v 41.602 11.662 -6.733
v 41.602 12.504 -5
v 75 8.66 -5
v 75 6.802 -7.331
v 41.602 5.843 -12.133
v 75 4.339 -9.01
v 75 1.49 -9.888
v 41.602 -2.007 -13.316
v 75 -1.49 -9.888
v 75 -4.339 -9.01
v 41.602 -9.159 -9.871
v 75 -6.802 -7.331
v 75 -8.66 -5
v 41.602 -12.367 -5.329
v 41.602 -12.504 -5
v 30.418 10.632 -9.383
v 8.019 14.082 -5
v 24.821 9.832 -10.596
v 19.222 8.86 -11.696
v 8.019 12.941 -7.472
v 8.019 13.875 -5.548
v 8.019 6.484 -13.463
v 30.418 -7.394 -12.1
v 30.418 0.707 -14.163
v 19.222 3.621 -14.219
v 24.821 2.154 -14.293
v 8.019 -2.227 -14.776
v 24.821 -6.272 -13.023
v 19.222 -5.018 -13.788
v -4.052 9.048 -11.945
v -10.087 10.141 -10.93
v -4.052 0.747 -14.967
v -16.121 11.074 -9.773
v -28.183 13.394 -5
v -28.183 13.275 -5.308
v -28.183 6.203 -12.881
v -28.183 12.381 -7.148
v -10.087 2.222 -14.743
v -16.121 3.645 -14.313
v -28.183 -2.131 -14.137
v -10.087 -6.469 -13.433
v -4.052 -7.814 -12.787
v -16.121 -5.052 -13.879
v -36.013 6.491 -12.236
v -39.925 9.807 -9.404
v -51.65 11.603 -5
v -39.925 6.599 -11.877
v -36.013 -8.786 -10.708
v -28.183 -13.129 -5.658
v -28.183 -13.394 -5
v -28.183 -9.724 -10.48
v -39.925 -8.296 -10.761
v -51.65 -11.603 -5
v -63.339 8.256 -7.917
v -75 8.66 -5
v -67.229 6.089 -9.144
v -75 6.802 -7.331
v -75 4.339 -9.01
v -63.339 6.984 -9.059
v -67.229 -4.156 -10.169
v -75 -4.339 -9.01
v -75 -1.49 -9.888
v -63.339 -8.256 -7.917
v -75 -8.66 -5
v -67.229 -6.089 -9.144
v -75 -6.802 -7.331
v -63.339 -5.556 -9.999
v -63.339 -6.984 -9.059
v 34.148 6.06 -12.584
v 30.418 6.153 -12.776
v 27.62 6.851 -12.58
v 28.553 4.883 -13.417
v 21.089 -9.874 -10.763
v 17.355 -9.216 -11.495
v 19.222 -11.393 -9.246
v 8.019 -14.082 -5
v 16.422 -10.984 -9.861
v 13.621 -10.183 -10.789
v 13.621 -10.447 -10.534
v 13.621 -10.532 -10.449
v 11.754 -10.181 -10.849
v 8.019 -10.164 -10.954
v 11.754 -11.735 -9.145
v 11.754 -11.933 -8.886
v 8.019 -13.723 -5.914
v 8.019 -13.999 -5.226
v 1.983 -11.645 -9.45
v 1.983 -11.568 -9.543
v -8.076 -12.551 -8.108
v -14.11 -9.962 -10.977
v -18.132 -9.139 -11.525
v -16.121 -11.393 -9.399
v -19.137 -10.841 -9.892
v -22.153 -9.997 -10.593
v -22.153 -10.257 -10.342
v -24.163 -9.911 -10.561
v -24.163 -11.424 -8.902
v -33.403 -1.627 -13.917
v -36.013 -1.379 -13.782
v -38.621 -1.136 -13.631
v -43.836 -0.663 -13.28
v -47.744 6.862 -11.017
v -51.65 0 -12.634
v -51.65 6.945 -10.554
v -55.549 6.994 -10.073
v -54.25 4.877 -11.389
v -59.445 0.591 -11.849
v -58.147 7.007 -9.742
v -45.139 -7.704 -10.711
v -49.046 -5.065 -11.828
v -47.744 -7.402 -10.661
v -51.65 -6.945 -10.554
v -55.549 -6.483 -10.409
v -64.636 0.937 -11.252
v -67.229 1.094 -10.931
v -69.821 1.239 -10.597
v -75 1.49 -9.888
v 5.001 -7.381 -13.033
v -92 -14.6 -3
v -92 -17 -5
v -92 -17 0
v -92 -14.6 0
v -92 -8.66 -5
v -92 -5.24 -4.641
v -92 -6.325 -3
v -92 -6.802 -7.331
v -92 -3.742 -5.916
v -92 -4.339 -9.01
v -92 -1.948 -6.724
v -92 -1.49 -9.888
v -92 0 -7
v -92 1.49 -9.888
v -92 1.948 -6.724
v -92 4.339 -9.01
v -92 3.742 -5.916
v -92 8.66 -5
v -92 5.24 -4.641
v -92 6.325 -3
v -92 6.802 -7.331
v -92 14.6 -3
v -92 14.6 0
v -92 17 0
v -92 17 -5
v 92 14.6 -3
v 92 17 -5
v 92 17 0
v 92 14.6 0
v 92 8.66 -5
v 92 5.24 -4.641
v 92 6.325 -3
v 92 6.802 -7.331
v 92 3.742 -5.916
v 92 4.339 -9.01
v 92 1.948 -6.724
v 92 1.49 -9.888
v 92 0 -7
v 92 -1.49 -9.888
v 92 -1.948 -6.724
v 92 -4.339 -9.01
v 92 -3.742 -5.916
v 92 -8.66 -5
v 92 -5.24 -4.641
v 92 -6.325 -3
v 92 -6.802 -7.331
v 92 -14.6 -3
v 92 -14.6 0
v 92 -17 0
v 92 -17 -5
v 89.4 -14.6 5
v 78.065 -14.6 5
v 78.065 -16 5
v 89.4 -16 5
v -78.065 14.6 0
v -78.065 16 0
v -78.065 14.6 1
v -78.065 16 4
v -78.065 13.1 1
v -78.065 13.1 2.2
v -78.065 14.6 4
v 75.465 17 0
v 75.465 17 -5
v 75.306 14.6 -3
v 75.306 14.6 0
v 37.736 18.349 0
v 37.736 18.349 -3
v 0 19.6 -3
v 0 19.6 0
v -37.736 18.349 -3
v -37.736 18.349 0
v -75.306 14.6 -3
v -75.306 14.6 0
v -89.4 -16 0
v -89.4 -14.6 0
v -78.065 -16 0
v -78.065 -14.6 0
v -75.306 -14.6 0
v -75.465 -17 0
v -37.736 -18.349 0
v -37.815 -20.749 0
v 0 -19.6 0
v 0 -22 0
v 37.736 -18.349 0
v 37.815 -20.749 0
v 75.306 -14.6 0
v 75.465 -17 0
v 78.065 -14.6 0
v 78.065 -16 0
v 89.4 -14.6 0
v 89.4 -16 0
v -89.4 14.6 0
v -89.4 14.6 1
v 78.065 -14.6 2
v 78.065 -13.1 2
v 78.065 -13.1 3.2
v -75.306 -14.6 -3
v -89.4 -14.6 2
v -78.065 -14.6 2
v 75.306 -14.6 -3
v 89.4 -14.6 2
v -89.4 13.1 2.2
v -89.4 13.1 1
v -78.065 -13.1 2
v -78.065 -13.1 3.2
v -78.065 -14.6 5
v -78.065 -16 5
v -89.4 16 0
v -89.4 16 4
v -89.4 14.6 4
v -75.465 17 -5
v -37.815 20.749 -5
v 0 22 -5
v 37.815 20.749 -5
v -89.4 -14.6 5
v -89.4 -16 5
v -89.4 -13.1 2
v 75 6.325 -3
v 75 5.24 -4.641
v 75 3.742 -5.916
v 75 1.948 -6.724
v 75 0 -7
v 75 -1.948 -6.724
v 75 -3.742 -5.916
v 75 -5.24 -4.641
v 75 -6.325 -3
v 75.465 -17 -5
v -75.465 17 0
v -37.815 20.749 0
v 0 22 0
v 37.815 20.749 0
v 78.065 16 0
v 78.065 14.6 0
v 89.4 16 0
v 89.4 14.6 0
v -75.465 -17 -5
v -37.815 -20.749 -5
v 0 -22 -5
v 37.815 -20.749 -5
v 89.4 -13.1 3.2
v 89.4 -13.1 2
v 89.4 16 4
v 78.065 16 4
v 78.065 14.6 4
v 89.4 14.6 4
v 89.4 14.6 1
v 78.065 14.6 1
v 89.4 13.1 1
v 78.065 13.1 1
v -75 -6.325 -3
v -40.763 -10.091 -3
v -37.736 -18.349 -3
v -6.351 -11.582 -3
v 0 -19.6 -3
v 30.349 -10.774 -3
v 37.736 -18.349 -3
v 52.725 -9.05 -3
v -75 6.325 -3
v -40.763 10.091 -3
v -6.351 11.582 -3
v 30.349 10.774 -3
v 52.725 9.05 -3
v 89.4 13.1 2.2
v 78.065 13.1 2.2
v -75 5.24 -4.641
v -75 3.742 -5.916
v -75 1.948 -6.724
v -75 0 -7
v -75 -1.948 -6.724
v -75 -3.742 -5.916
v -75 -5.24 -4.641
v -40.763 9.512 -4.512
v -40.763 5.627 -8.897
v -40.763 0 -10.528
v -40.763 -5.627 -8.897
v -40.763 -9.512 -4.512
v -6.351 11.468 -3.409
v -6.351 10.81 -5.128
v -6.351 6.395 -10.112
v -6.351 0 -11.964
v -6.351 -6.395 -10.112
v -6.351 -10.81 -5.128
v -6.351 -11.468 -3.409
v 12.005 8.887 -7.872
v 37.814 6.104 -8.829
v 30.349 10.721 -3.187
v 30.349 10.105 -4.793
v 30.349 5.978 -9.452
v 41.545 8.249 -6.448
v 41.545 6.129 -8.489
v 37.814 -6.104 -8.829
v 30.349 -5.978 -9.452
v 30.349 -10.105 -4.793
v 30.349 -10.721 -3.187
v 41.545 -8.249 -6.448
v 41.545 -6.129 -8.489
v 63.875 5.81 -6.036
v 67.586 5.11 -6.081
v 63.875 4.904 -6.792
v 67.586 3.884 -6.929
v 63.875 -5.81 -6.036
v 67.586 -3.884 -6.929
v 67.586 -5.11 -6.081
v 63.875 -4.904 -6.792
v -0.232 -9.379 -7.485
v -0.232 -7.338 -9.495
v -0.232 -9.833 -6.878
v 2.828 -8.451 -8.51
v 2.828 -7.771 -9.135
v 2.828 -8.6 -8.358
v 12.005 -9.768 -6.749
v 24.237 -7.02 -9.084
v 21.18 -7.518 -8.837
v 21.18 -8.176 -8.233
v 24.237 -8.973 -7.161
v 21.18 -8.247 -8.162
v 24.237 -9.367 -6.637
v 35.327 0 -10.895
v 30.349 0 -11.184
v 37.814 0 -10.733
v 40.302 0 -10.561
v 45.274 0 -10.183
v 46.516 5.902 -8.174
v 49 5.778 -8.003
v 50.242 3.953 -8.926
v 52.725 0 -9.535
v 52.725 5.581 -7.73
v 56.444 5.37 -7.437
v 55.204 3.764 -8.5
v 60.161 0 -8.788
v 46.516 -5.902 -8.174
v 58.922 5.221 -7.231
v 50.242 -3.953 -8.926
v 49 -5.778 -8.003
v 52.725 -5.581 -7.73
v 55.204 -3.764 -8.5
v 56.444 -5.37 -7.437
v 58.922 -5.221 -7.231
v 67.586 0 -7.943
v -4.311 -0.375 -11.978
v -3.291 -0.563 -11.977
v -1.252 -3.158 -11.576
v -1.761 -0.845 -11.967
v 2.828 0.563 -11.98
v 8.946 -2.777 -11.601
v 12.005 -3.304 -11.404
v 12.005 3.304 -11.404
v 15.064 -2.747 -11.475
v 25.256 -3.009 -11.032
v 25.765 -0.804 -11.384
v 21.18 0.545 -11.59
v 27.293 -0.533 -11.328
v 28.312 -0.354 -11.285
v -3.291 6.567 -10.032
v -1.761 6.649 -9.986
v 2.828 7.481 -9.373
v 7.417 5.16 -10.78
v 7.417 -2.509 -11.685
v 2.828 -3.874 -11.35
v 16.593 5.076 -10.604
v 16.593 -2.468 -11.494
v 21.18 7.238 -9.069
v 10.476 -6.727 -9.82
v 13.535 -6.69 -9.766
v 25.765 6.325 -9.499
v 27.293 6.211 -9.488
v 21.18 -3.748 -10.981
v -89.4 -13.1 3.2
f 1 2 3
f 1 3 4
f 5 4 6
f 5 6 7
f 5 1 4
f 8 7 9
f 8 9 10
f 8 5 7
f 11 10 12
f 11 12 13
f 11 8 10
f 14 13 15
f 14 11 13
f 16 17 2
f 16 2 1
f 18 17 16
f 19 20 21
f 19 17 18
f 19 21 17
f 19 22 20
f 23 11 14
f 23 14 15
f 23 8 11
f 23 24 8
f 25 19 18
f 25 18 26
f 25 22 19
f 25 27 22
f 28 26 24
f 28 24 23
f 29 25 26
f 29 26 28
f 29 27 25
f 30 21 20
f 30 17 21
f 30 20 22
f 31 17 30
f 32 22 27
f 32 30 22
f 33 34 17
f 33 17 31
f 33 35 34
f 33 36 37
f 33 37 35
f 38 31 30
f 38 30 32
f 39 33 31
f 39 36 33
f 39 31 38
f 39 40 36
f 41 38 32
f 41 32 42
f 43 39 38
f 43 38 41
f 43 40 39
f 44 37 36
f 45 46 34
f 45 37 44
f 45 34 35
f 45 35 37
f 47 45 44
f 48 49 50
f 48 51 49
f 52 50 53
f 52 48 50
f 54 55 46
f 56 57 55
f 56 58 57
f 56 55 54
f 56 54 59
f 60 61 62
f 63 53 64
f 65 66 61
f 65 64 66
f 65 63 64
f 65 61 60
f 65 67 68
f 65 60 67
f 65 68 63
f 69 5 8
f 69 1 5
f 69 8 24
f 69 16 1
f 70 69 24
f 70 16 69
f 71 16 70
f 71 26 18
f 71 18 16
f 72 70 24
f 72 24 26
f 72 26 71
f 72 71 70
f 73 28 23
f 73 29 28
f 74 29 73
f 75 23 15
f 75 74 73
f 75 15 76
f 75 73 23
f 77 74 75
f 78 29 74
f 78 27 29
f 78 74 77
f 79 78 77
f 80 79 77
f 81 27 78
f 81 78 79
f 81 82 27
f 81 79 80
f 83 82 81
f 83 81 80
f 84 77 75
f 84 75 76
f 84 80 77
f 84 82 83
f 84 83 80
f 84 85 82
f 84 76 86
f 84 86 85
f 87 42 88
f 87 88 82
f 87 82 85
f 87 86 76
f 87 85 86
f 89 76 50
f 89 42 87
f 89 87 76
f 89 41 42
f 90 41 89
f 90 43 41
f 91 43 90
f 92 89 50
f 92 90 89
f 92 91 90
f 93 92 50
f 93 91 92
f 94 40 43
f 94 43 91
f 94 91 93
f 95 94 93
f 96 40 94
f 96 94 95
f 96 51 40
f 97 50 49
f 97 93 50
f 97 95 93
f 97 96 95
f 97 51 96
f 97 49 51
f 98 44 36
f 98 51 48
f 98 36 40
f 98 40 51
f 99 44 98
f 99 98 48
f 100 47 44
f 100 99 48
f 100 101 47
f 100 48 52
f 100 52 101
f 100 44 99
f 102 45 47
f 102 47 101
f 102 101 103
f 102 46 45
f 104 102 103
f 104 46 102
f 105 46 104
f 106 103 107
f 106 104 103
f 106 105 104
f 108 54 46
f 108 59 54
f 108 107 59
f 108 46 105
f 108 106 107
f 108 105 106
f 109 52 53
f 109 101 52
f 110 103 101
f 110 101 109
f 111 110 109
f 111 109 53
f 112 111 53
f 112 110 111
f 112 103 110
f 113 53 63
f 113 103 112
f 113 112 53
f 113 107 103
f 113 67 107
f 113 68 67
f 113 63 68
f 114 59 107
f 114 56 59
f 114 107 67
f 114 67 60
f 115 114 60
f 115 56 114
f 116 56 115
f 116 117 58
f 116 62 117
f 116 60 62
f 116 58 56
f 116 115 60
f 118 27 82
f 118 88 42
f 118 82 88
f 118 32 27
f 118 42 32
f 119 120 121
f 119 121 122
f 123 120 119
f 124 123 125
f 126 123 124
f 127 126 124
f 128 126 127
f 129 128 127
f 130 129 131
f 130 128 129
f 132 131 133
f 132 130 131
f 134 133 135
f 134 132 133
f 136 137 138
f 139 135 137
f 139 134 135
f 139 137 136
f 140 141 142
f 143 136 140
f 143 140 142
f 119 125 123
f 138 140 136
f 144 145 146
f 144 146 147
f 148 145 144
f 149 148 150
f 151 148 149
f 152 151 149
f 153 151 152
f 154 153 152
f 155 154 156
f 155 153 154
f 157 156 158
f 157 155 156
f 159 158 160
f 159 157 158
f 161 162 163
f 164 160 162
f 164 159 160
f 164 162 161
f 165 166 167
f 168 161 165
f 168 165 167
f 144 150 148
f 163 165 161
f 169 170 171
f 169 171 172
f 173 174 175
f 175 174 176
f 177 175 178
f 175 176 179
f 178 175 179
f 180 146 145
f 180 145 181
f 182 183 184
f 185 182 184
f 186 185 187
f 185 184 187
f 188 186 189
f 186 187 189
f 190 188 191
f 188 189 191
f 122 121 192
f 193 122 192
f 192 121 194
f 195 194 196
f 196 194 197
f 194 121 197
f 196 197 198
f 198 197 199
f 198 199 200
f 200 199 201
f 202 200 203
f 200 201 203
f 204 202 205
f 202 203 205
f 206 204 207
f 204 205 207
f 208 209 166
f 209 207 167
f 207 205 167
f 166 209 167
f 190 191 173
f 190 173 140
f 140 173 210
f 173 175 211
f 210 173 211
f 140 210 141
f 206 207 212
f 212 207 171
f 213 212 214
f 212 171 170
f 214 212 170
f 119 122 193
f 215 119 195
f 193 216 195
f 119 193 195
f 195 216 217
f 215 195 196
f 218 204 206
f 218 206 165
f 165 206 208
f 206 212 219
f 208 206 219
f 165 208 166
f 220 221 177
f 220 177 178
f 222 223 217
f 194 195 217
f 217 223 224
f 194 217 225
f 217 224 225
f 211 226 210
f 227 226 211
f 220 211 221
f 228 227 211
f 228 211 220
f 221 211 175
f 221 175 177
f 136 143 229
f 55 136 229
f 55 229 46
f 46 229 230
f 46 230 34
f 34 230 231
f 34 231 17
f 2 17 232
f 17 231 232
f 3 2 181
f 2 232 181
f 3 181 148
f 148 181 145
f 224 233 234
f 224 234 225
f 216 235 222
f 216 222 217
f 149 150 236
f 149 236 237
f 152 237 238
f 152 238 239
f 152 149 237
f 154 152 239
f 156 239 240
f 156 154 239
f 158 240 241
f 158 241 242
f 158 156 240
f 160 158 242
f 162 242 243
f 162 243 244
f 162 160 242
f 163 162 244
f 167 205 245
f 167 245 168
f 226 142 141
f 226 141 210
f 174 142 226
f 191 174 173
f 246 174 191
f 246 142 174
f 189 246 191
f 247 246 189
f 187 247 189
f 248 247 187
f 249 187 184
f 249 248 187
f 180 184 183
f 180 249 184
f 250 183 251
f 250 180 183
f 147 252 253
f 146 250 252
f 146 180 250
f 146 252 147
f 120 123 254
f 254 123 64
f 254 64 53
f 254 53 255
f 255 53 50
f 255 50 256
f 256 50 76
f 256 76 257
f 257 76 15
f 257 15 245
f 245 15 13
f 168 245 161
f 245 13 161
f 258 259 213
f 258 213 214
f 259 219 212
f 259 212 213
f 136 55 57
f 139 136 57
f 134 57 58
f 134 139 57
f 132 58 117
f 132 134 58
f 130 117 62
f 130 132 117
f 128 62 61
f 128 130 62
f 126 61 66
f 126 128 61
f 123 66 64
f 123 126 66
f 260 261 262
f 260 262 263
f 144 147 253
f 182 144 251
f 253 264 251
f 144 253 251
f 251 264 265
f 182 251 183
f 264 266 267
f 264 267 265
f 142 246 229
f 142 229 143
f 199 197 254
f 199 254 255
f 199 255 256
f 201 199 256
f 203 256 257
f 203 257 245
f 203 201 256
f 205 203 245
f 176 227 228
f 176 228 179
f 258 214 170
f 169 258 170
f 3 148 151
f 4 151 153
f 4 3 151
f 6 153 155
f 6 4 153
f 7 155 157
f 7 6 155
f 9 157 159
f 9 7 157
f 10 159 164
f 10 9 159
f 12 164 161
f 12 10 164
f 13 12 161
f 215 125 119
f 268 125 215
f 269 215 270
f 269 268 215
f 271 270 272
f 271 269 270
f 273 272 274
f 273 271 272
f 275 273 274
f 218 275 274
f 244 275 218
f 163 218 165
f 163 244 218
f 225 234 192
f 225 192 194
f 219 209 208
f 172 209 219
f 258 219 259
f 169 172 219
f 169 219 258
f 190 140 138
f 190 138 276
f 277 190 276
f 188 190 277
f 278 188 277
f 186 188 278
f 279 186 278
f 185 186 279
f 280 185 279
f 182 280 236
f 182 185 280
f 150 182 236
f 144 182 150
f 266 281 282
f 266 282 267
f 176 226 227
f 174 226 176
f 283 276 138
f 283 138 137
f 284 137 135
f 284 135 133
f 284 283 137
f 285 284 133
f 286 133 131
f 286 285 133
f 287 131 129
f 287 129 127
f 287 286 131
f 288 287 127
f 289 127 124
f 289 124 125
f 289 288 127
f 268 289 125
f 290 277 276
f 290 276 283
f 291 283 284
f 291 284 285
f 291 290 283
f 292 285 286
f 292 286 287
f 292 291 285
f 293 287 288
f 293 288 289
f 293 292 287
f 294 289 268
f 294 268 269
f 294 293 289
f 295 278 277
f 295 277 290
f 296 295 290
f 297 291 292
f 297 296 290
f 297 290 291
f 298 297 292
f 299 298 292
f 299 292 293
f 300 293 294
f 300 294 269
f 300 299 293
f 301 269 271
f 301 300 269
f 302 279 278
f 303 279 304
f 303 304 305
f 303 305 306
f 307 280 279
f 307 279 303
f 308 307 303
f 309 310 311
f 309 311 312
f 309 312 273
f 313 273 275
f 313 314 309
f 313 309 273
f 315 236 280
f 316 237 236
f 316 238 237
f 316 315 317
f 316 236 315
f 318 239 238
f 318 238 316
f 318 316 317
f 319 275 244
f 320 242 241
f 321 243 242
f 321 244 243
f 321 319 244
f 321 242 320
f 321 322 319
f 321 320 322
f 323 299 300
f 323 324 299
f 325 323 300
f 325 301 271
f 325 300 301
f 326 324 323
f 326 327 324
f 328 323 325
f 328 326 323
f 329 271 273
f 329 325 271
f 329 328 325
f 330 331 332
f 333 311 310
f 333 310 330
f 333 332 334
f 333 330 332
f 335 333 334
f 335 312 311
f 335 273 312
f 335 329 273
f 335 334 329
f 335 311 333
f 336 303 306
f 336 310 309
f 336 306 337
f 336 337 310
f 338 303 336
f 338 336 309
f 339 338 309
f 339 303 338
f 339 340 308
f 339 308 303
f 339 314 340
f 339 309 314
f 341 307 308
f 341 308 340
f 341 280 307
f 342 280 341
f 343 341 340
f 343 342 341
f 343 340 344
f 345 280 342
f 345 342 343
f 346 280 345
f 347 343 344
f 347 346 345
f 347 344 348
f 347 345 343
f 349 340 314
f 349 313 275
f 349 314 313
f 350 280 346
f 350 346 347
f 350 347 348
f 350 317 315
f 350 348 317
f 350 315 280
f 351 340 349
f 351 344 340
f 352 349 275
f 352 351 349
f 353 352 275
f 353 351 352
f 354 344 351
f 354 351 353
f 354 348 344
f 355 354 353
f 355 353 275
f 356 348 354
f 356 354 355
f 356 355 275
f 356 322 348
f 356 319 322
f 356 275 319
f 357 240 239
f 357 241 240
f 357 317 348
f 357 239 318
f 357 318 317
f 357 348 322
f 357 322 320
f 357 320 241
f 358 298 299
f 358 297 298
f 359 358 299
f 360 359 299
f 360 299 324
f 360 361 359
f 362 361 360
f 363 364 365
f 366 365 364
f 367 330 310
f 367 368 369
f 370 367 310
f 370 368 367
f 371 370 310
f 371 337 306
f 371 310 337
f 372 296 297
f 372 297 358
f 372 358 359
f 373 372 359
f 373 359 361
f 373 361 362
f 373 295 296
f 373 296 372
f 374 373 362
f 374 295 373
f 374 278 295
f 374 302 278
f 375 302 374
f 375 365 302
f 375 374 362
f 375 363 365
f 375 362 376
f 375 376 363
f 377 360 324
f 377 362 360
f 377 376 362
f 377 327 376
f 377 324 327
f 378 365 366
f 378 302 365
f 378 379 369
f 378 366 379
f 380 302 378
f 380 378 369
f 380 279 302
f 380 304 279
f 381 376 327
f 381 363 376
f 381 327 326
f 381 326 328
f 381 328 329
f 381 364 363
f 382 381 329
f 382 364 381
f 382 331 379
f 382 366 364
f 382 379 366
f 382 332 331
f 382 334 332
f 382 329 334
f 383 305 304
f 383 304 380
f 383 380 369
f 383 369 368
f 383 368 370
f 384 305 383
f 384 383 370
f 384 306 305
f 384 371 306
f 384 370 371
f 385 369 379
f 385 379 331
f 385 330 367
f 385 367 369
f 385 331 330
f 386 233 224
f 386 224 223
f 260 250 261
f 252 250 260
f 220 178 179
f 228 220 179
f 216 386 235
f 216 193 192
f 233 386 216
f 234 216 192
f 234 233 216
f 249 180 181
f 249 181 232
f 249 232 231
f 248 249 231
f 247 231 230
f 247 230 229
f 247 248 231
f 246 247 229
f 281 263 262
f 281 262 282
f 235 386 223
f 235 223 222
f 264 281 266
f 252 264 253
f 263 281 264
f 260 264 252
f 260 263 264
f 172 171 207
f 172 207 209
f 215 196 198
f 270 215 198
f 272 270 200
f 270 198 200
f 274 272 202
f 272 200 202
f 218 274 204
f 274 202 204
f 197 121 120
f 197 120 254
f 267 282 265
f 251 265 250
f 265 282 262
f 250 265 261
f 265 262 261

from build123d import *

# Parameters (mm, degrees)
F1_ANGLE  = 180
F3_DEPTH  = 5
F5_DEPTH  = 5
F7_DEPTH  = 3
F9_DEPTH  = 17
F11_DEPTH = 17
F13_DEPTH = 3
F15_DEPTH = 17
F17_DEPTH = 17
F19_DEPTH = 3
F21_DEPTH = 3
F22_W     = 11.3347762211
F22_H     = 1.4
F23_DEPTH = 4
F24_W     = 11.3347762211
F24_H     = 2.4
F25_DEPTH = 5
F27_DEPTH = 11.3347762211
F28_W     = 11.3347762211
F28_H     = 5
F29_DEPTH = 1
F31_DEPTH = 11.3347762211
F32_W     = 11.3347762211
F32_H     = 5
F33_DEPTH = 1
F35_DEPTH = 11.3347762211
F37_DEPTH = 11.3347762211


with BuildPart() as f1:
    # F0 (on Top) → F1 (revolve)
    with BuildSketch(Plane.XY):
        with BuildLine():
            ThreePointArc((-75, 7), (0, 12), (75, 7))
            Line((75, 7), (92, 7))
            Line((92, 7), (92, 10))
            Line((92, 10), (75, 10))
            ThreePointArc((75, 10), (0, 15), (-75, 10))
            Line((-75, 10), (-92, 10))
            Line((-92, 10), (-92, 7))
            Line((-92, 7), (-75, 7))
        make_face()
    revolve(axis=Axis((-37.5, 0, 0), (-1, 0, 0)), revolution_arc=F1_ANGLE)

    # F2 (on face) → F3 (join)
    with BuildSketch(Plane.XY):
        with BuildLine():
            Line((-75, 10), (-92, 10))
            Line((-92, 10), (-92, 7))
            Line((-92, 7), (-75, 7))
            ThreePointArc((-75, 7), (0, 12), (75, 7))
            Line((75, 7), (92, 7))
            Line((92, 7), (92, 10))
            Line((92, 10), (75, 10))
            ThreePointArc((75, 10), (0, 15), (-75, 10))
        make_face()
        with BuildLine():
            Line((-75.4652237789, 17), (-92, 17))
            Line((-92, 17), (-92, 10))
            Line((-92, 10), (-75, 10))
            ThreePointArc((-75, 10), (0, 15), (75, 10))
            Line((75, 10), (92, 10))
            Line((92, 10), (92, 17))
            Line((92, 17), (75.4652237789, 17))
            ThreePointArc((75.4652237789, 17), (0, 22), (-75.4652237789, 17))
        make_face()
    extrude(amount=-F3_DEPTH)

    # F4 (on face) → F5 (join)
    with BuildSketch(Plane.XY):
        with BuildLine():
            Line((-92, -7), (-92, -10))
            Line((-92, -10), (-75, -10))
            ThreePointArc((-75, -10), (0, -15), (75, -10))
            Line((75, -10), (92, -10))
            Line((92, -10), (92, -7))
            Line((92, -7), (75, -7))
            ThreePointArc((75, -7), (0, -12), (-75, -7))
            Line((-75, -7), (-92, -7))
        make_face()
        with BuildLine():
            Line((-92, -10), (-92, -17))
            Line((-92, -17), (-75.4652237789, -17))
            ThreePointArc((-75.4652237789, -17), (0, -22), (75.4652237789, -17))
            Line((75.4652237789, -17), (92, -17))
            Line((92, -17), (92, -10))
            Line((92, -10), (75, -10))
            ThreePointArc((75, -10), (0, -15), (-75, -10))
            Line((-75, -10), (-92, -10))
        make_face()
    extrude(amount=-F5_DEPTH)

    # F6 (on face) → F7 (cut)
    with BuildSketch(Plane.XY):
        with BuildLine():
            Line((-75.3060422543, 14.6), (-92, 14.6))
            Line((-92, 14.6), (-92, 7))
            Line((-92, 7), (-75, 7))
            Line((-75, 7), (-75, 8.8160197075))
            ThreePointArc((-75, 8.8160197075), (0, 13.8), (75, 8.8160197075))
            Line((75, 8.8160197075), (75, 7))
            Line((75, 7), (92, 7))
            Line((92, 7), (92, 14.6))
            Line((92, 14.6), (75.3060422543, 14.6))
            ThreePointArc((75.3060422543, 14.6), (0, 19.6), (-75.3060422543, 14.6))
        make_face()
        with BuildLine():
            Line((-75, 8.8160197075), (-75, 7))
            ThreePointArc((-75, 7), (0, 12), (75, 7))
            Line((75, 7), (75, 8.8160197075))
            ThreePointArc((75, 8.8160197075), (0, 13.8), (-75, 8.8160197075))
        make_face()
    extrude(amount=-F7_DEPTH, mode=Mode.SUBTRACT)

    # F8 (on face) → F9 (cut)
    with BuildSketch(Plane(origin=(-92, 0, 0), x_dir=(0, -1, 0), z_dir=(-1, 0, 0))):
        with BuildLine():
            Line((-7, 0), (-7, -3))
            Line((-7, -3), (-6.3245553203, -3))
            ThreePointArc((-6.3245553203, -3), (-6.8290514437, -1.5375488216), (-7, 0))
        make_face()
    extrude(amount=-F9_DEPTH, mode=Mode.SUBTRACT)

    # F10 (on face) → F11 (cut)
    with BuildSketch(Plane.YZ.offset(92)):
        with BuildLine():
            Line((6.3245553203, -3), (7, -3))
            Line((7, -3), (7, 0))
            ThreePointArc((7, 0), (6.8290514437, -1.5375488216), (6.3245553203, -3))
        make_face()
    extrude(amount=-F11_DEPTH, mode=Mode.SUBTRACT)

    # F12 (on face) → F13 (cut)
    with BuildSketch(Plane.XY):
        with BuildLine():
            Line((-92, -7), (-92, -8.8))
            Line((-92, -8.8), (-75.1199041533, -8.8))
            ThreePointArc((-75.1199041533, -8.8), (-75.059952504, -8.8080130526), (-75, -8.8160197075))
            Line((-75, -8.8160197075), (-75, -7))
            Line((-75, -7), (-92, -7))
        make_face()
        with BuildLine():
            Line((-92, -8.8), (-92, -14.6))
            Line((-92, -14.6), (-75.3060422543, -14.6))
            ThreePointArc((-75.3060422543, -14.6), (0, -19.6), (75.3060422543, -14.6))
            Line((75.3060422543, -14.6), (92, -14.6))
            Line((92, -14.6), (92, -8.8))
            Line((92, -8.8), (75.1199041533, -8.8))
            ThreePointArc((75.1199041533, -8.8), (75.059952504, -8.8080130526), (75, -8.8160197075))
            ThreePointArc((75, -8.8160197075), (0, -13.8), (-75, -8.8160197075))
            ThreePointArc((-75, -8.8160197075), (-75.059952504, -8.8080130526), (-75.1199041533, -8.8))
            Line((-75.1199041533, -8.8), (-92, -8.8))
        make_face()
        with BuildLine():
            Line((75.1199041533, -8.8), (92, -8.8))
            Line((92, -8.8), (92, -7))
            Line((92, -7), (75, -7))
            Line((75, -7), (75, -8.8160197075))
            ThreePointArc((75, -8.8160197075), (75.059952504, -8.8080130526), (75.1199041533, -8.8))
        make_face()
    extrude(amount=-F13_DEPTH, mode=Mode.SUBTRACT)

    # F14 (on face) → F15 (cut)
    with BuildSketch(Plane(origin=(-92, 0, 0), x_dir=(0, -1, 0), z_dir=(-1, 0, 0))):
        with BuildLine():
            Line((6.3245553203, -3), (7, -3))
            Line((7, -3), (7, 0))
            ThreePointArc((7, 0), (6.8290514437, -1.5375488216), (6.3245553203, -3))
        make_face()
    extrude(amount=-F15_DEPTH, mode=Mode.SUBTRACT)

    # F16 (on face) → F17 (cut)
    with BuildSketch(Plane.YZ.offset(92)):
        with BuildLine():
            Line((-7, 0), (-7, -3))
            Line((-7, -3), (-6.3245553203, -3))
            ThreePointArc((-6.3245553203, -3), (-6.8290514437, -1.5375488216), (-7, 0))
        make_face()
    extrude(amount=-F17_DEPTH, mode=Mode.SUBTRACT)

    # F18 (on face) → F19 (cut)
    with BuildSketch(Plane.XY):
        with BuildLine():
            ThreePointArc((75, 7), (0, 12), (-75, 7))
            Line((-75, 7), (-75, 5.4070060141))
            Line((-75, 5.4070060141), (75, 5.4070060141))
            Line((75, 5.4070060141), (75, 7))
        make_face()
    extrude(amount=-F19_DEPTH, mode=Mode.SUBTRACT)

    # F20 (on face) → F21 (cut)
    with BuildSketch(Plane.XY):
        with BuildLine():
            Line((-75, -5.2931243554), (-75, -7))
            ThreePointArc((-75, -7), (0, -12), (75, -7))
            Line((75, -7), (75, -5.2931243554))
            Line((75, -5.2931243554), (-75, -5.2931243554))
        make_face()
        with BuildLine():
            Line((-75, -7), (-75, -8.8160197075))
            ThreePointArc((-75, -8.8160197075), (0, -13.8), (75, -8.8160197075))
            Line((75, -8.8160197075), (75, -7))
            ThreePointArc((75, -7), (0, -12), (-75, -7))
        make_face()
    extrude(amount=-F21_DEPTH, mode=Mode.SUBTRACT)

    # F22 (on face) → F23 (join)
    with BuildSketch(Plane.XY):
        with Locations((83.7326118895, 15.3)):
            Rectangle(F22_W, F22_H)
        with Locations((-83.7326118895, 15.3)):
            Rectangle(F22_W, F22_H)
    extrude(amount=F23_DEPTH)

    # F24 (on face) → F25 (join)
    with BuildSketch(Plane.XY):
        with Locations((83.7326118895, -15.8)):
            Rectangle(F24_W, F24_H)
        with Locations((-83.7326118895, -15.8)):
            Rectangle(F24_W, F24_H)
    extrude(amount=F25_DEPTH)

    # F26 (on face) → F27 (join, through all)
    with BuildSketch(Plane(origin=(-89.4, 0, 0), x_dir=(0, -1, 0), z_dir=(-1, 0, 0))):
        Polygon((13.1, 3.2), (13.1, 2), (14.6, 2), (14.6, 5), align=None)
    extrude(amount=-F27_DEPTH)

    # F28 (on face) → F29 (cut)
    with BuildSketch(Plane.XZ.offset(17)):
        with Locations((-83.7326118895, 2.5)):
            Rectangle(F28_W, F28_H)
    extrude(amount=-F29_DEPTH, mode=Mode.SUBTRACT)

    # F30 (on face) → F31 (join, through all)
    with BuildSketch(Plane.YZ.offset(89.4)):
        Polygon((-14.6, 5), (-14.6, 2), (-13.1, 2), (-13.1, 3.2), align=None)
    extrude(amount=-F31_DEPTH)

    # F32 (on face) → F33 (cut)
    with BuildSketch(Plane.XZ.offset(17)):
        with Locations((83.7326118895, 2.5)):
            Rectangle(F32_W, F32_H)
    extrude(amount=-F33_DEPTH, mode=Mode.SUBTRACT)

    # F34 (on face) → F35 (join, through all)
    with BuildSketch(Plane.YZ.offset(89.4)):
        Polygon((13.1, 1), (14.6, 1), (14.6, 4), (13.1, 2.2), align=None)
    extrude(amount=-F35_DEPTH)

    # F36 (on face) → F37 (join, through all)
    with BuildSketch(Plane(origin=(-89.4, 0, 0), x_dir=(0, -1, 0), z_dir=(-1, 0, 0))):
        Polygon((-14.6, 4), (-14.6, 1), (-13.1, 1), (-13.1, 2.2), align=None)
    extrude(amount=-F37_DEPTH)


solid = f1.part
